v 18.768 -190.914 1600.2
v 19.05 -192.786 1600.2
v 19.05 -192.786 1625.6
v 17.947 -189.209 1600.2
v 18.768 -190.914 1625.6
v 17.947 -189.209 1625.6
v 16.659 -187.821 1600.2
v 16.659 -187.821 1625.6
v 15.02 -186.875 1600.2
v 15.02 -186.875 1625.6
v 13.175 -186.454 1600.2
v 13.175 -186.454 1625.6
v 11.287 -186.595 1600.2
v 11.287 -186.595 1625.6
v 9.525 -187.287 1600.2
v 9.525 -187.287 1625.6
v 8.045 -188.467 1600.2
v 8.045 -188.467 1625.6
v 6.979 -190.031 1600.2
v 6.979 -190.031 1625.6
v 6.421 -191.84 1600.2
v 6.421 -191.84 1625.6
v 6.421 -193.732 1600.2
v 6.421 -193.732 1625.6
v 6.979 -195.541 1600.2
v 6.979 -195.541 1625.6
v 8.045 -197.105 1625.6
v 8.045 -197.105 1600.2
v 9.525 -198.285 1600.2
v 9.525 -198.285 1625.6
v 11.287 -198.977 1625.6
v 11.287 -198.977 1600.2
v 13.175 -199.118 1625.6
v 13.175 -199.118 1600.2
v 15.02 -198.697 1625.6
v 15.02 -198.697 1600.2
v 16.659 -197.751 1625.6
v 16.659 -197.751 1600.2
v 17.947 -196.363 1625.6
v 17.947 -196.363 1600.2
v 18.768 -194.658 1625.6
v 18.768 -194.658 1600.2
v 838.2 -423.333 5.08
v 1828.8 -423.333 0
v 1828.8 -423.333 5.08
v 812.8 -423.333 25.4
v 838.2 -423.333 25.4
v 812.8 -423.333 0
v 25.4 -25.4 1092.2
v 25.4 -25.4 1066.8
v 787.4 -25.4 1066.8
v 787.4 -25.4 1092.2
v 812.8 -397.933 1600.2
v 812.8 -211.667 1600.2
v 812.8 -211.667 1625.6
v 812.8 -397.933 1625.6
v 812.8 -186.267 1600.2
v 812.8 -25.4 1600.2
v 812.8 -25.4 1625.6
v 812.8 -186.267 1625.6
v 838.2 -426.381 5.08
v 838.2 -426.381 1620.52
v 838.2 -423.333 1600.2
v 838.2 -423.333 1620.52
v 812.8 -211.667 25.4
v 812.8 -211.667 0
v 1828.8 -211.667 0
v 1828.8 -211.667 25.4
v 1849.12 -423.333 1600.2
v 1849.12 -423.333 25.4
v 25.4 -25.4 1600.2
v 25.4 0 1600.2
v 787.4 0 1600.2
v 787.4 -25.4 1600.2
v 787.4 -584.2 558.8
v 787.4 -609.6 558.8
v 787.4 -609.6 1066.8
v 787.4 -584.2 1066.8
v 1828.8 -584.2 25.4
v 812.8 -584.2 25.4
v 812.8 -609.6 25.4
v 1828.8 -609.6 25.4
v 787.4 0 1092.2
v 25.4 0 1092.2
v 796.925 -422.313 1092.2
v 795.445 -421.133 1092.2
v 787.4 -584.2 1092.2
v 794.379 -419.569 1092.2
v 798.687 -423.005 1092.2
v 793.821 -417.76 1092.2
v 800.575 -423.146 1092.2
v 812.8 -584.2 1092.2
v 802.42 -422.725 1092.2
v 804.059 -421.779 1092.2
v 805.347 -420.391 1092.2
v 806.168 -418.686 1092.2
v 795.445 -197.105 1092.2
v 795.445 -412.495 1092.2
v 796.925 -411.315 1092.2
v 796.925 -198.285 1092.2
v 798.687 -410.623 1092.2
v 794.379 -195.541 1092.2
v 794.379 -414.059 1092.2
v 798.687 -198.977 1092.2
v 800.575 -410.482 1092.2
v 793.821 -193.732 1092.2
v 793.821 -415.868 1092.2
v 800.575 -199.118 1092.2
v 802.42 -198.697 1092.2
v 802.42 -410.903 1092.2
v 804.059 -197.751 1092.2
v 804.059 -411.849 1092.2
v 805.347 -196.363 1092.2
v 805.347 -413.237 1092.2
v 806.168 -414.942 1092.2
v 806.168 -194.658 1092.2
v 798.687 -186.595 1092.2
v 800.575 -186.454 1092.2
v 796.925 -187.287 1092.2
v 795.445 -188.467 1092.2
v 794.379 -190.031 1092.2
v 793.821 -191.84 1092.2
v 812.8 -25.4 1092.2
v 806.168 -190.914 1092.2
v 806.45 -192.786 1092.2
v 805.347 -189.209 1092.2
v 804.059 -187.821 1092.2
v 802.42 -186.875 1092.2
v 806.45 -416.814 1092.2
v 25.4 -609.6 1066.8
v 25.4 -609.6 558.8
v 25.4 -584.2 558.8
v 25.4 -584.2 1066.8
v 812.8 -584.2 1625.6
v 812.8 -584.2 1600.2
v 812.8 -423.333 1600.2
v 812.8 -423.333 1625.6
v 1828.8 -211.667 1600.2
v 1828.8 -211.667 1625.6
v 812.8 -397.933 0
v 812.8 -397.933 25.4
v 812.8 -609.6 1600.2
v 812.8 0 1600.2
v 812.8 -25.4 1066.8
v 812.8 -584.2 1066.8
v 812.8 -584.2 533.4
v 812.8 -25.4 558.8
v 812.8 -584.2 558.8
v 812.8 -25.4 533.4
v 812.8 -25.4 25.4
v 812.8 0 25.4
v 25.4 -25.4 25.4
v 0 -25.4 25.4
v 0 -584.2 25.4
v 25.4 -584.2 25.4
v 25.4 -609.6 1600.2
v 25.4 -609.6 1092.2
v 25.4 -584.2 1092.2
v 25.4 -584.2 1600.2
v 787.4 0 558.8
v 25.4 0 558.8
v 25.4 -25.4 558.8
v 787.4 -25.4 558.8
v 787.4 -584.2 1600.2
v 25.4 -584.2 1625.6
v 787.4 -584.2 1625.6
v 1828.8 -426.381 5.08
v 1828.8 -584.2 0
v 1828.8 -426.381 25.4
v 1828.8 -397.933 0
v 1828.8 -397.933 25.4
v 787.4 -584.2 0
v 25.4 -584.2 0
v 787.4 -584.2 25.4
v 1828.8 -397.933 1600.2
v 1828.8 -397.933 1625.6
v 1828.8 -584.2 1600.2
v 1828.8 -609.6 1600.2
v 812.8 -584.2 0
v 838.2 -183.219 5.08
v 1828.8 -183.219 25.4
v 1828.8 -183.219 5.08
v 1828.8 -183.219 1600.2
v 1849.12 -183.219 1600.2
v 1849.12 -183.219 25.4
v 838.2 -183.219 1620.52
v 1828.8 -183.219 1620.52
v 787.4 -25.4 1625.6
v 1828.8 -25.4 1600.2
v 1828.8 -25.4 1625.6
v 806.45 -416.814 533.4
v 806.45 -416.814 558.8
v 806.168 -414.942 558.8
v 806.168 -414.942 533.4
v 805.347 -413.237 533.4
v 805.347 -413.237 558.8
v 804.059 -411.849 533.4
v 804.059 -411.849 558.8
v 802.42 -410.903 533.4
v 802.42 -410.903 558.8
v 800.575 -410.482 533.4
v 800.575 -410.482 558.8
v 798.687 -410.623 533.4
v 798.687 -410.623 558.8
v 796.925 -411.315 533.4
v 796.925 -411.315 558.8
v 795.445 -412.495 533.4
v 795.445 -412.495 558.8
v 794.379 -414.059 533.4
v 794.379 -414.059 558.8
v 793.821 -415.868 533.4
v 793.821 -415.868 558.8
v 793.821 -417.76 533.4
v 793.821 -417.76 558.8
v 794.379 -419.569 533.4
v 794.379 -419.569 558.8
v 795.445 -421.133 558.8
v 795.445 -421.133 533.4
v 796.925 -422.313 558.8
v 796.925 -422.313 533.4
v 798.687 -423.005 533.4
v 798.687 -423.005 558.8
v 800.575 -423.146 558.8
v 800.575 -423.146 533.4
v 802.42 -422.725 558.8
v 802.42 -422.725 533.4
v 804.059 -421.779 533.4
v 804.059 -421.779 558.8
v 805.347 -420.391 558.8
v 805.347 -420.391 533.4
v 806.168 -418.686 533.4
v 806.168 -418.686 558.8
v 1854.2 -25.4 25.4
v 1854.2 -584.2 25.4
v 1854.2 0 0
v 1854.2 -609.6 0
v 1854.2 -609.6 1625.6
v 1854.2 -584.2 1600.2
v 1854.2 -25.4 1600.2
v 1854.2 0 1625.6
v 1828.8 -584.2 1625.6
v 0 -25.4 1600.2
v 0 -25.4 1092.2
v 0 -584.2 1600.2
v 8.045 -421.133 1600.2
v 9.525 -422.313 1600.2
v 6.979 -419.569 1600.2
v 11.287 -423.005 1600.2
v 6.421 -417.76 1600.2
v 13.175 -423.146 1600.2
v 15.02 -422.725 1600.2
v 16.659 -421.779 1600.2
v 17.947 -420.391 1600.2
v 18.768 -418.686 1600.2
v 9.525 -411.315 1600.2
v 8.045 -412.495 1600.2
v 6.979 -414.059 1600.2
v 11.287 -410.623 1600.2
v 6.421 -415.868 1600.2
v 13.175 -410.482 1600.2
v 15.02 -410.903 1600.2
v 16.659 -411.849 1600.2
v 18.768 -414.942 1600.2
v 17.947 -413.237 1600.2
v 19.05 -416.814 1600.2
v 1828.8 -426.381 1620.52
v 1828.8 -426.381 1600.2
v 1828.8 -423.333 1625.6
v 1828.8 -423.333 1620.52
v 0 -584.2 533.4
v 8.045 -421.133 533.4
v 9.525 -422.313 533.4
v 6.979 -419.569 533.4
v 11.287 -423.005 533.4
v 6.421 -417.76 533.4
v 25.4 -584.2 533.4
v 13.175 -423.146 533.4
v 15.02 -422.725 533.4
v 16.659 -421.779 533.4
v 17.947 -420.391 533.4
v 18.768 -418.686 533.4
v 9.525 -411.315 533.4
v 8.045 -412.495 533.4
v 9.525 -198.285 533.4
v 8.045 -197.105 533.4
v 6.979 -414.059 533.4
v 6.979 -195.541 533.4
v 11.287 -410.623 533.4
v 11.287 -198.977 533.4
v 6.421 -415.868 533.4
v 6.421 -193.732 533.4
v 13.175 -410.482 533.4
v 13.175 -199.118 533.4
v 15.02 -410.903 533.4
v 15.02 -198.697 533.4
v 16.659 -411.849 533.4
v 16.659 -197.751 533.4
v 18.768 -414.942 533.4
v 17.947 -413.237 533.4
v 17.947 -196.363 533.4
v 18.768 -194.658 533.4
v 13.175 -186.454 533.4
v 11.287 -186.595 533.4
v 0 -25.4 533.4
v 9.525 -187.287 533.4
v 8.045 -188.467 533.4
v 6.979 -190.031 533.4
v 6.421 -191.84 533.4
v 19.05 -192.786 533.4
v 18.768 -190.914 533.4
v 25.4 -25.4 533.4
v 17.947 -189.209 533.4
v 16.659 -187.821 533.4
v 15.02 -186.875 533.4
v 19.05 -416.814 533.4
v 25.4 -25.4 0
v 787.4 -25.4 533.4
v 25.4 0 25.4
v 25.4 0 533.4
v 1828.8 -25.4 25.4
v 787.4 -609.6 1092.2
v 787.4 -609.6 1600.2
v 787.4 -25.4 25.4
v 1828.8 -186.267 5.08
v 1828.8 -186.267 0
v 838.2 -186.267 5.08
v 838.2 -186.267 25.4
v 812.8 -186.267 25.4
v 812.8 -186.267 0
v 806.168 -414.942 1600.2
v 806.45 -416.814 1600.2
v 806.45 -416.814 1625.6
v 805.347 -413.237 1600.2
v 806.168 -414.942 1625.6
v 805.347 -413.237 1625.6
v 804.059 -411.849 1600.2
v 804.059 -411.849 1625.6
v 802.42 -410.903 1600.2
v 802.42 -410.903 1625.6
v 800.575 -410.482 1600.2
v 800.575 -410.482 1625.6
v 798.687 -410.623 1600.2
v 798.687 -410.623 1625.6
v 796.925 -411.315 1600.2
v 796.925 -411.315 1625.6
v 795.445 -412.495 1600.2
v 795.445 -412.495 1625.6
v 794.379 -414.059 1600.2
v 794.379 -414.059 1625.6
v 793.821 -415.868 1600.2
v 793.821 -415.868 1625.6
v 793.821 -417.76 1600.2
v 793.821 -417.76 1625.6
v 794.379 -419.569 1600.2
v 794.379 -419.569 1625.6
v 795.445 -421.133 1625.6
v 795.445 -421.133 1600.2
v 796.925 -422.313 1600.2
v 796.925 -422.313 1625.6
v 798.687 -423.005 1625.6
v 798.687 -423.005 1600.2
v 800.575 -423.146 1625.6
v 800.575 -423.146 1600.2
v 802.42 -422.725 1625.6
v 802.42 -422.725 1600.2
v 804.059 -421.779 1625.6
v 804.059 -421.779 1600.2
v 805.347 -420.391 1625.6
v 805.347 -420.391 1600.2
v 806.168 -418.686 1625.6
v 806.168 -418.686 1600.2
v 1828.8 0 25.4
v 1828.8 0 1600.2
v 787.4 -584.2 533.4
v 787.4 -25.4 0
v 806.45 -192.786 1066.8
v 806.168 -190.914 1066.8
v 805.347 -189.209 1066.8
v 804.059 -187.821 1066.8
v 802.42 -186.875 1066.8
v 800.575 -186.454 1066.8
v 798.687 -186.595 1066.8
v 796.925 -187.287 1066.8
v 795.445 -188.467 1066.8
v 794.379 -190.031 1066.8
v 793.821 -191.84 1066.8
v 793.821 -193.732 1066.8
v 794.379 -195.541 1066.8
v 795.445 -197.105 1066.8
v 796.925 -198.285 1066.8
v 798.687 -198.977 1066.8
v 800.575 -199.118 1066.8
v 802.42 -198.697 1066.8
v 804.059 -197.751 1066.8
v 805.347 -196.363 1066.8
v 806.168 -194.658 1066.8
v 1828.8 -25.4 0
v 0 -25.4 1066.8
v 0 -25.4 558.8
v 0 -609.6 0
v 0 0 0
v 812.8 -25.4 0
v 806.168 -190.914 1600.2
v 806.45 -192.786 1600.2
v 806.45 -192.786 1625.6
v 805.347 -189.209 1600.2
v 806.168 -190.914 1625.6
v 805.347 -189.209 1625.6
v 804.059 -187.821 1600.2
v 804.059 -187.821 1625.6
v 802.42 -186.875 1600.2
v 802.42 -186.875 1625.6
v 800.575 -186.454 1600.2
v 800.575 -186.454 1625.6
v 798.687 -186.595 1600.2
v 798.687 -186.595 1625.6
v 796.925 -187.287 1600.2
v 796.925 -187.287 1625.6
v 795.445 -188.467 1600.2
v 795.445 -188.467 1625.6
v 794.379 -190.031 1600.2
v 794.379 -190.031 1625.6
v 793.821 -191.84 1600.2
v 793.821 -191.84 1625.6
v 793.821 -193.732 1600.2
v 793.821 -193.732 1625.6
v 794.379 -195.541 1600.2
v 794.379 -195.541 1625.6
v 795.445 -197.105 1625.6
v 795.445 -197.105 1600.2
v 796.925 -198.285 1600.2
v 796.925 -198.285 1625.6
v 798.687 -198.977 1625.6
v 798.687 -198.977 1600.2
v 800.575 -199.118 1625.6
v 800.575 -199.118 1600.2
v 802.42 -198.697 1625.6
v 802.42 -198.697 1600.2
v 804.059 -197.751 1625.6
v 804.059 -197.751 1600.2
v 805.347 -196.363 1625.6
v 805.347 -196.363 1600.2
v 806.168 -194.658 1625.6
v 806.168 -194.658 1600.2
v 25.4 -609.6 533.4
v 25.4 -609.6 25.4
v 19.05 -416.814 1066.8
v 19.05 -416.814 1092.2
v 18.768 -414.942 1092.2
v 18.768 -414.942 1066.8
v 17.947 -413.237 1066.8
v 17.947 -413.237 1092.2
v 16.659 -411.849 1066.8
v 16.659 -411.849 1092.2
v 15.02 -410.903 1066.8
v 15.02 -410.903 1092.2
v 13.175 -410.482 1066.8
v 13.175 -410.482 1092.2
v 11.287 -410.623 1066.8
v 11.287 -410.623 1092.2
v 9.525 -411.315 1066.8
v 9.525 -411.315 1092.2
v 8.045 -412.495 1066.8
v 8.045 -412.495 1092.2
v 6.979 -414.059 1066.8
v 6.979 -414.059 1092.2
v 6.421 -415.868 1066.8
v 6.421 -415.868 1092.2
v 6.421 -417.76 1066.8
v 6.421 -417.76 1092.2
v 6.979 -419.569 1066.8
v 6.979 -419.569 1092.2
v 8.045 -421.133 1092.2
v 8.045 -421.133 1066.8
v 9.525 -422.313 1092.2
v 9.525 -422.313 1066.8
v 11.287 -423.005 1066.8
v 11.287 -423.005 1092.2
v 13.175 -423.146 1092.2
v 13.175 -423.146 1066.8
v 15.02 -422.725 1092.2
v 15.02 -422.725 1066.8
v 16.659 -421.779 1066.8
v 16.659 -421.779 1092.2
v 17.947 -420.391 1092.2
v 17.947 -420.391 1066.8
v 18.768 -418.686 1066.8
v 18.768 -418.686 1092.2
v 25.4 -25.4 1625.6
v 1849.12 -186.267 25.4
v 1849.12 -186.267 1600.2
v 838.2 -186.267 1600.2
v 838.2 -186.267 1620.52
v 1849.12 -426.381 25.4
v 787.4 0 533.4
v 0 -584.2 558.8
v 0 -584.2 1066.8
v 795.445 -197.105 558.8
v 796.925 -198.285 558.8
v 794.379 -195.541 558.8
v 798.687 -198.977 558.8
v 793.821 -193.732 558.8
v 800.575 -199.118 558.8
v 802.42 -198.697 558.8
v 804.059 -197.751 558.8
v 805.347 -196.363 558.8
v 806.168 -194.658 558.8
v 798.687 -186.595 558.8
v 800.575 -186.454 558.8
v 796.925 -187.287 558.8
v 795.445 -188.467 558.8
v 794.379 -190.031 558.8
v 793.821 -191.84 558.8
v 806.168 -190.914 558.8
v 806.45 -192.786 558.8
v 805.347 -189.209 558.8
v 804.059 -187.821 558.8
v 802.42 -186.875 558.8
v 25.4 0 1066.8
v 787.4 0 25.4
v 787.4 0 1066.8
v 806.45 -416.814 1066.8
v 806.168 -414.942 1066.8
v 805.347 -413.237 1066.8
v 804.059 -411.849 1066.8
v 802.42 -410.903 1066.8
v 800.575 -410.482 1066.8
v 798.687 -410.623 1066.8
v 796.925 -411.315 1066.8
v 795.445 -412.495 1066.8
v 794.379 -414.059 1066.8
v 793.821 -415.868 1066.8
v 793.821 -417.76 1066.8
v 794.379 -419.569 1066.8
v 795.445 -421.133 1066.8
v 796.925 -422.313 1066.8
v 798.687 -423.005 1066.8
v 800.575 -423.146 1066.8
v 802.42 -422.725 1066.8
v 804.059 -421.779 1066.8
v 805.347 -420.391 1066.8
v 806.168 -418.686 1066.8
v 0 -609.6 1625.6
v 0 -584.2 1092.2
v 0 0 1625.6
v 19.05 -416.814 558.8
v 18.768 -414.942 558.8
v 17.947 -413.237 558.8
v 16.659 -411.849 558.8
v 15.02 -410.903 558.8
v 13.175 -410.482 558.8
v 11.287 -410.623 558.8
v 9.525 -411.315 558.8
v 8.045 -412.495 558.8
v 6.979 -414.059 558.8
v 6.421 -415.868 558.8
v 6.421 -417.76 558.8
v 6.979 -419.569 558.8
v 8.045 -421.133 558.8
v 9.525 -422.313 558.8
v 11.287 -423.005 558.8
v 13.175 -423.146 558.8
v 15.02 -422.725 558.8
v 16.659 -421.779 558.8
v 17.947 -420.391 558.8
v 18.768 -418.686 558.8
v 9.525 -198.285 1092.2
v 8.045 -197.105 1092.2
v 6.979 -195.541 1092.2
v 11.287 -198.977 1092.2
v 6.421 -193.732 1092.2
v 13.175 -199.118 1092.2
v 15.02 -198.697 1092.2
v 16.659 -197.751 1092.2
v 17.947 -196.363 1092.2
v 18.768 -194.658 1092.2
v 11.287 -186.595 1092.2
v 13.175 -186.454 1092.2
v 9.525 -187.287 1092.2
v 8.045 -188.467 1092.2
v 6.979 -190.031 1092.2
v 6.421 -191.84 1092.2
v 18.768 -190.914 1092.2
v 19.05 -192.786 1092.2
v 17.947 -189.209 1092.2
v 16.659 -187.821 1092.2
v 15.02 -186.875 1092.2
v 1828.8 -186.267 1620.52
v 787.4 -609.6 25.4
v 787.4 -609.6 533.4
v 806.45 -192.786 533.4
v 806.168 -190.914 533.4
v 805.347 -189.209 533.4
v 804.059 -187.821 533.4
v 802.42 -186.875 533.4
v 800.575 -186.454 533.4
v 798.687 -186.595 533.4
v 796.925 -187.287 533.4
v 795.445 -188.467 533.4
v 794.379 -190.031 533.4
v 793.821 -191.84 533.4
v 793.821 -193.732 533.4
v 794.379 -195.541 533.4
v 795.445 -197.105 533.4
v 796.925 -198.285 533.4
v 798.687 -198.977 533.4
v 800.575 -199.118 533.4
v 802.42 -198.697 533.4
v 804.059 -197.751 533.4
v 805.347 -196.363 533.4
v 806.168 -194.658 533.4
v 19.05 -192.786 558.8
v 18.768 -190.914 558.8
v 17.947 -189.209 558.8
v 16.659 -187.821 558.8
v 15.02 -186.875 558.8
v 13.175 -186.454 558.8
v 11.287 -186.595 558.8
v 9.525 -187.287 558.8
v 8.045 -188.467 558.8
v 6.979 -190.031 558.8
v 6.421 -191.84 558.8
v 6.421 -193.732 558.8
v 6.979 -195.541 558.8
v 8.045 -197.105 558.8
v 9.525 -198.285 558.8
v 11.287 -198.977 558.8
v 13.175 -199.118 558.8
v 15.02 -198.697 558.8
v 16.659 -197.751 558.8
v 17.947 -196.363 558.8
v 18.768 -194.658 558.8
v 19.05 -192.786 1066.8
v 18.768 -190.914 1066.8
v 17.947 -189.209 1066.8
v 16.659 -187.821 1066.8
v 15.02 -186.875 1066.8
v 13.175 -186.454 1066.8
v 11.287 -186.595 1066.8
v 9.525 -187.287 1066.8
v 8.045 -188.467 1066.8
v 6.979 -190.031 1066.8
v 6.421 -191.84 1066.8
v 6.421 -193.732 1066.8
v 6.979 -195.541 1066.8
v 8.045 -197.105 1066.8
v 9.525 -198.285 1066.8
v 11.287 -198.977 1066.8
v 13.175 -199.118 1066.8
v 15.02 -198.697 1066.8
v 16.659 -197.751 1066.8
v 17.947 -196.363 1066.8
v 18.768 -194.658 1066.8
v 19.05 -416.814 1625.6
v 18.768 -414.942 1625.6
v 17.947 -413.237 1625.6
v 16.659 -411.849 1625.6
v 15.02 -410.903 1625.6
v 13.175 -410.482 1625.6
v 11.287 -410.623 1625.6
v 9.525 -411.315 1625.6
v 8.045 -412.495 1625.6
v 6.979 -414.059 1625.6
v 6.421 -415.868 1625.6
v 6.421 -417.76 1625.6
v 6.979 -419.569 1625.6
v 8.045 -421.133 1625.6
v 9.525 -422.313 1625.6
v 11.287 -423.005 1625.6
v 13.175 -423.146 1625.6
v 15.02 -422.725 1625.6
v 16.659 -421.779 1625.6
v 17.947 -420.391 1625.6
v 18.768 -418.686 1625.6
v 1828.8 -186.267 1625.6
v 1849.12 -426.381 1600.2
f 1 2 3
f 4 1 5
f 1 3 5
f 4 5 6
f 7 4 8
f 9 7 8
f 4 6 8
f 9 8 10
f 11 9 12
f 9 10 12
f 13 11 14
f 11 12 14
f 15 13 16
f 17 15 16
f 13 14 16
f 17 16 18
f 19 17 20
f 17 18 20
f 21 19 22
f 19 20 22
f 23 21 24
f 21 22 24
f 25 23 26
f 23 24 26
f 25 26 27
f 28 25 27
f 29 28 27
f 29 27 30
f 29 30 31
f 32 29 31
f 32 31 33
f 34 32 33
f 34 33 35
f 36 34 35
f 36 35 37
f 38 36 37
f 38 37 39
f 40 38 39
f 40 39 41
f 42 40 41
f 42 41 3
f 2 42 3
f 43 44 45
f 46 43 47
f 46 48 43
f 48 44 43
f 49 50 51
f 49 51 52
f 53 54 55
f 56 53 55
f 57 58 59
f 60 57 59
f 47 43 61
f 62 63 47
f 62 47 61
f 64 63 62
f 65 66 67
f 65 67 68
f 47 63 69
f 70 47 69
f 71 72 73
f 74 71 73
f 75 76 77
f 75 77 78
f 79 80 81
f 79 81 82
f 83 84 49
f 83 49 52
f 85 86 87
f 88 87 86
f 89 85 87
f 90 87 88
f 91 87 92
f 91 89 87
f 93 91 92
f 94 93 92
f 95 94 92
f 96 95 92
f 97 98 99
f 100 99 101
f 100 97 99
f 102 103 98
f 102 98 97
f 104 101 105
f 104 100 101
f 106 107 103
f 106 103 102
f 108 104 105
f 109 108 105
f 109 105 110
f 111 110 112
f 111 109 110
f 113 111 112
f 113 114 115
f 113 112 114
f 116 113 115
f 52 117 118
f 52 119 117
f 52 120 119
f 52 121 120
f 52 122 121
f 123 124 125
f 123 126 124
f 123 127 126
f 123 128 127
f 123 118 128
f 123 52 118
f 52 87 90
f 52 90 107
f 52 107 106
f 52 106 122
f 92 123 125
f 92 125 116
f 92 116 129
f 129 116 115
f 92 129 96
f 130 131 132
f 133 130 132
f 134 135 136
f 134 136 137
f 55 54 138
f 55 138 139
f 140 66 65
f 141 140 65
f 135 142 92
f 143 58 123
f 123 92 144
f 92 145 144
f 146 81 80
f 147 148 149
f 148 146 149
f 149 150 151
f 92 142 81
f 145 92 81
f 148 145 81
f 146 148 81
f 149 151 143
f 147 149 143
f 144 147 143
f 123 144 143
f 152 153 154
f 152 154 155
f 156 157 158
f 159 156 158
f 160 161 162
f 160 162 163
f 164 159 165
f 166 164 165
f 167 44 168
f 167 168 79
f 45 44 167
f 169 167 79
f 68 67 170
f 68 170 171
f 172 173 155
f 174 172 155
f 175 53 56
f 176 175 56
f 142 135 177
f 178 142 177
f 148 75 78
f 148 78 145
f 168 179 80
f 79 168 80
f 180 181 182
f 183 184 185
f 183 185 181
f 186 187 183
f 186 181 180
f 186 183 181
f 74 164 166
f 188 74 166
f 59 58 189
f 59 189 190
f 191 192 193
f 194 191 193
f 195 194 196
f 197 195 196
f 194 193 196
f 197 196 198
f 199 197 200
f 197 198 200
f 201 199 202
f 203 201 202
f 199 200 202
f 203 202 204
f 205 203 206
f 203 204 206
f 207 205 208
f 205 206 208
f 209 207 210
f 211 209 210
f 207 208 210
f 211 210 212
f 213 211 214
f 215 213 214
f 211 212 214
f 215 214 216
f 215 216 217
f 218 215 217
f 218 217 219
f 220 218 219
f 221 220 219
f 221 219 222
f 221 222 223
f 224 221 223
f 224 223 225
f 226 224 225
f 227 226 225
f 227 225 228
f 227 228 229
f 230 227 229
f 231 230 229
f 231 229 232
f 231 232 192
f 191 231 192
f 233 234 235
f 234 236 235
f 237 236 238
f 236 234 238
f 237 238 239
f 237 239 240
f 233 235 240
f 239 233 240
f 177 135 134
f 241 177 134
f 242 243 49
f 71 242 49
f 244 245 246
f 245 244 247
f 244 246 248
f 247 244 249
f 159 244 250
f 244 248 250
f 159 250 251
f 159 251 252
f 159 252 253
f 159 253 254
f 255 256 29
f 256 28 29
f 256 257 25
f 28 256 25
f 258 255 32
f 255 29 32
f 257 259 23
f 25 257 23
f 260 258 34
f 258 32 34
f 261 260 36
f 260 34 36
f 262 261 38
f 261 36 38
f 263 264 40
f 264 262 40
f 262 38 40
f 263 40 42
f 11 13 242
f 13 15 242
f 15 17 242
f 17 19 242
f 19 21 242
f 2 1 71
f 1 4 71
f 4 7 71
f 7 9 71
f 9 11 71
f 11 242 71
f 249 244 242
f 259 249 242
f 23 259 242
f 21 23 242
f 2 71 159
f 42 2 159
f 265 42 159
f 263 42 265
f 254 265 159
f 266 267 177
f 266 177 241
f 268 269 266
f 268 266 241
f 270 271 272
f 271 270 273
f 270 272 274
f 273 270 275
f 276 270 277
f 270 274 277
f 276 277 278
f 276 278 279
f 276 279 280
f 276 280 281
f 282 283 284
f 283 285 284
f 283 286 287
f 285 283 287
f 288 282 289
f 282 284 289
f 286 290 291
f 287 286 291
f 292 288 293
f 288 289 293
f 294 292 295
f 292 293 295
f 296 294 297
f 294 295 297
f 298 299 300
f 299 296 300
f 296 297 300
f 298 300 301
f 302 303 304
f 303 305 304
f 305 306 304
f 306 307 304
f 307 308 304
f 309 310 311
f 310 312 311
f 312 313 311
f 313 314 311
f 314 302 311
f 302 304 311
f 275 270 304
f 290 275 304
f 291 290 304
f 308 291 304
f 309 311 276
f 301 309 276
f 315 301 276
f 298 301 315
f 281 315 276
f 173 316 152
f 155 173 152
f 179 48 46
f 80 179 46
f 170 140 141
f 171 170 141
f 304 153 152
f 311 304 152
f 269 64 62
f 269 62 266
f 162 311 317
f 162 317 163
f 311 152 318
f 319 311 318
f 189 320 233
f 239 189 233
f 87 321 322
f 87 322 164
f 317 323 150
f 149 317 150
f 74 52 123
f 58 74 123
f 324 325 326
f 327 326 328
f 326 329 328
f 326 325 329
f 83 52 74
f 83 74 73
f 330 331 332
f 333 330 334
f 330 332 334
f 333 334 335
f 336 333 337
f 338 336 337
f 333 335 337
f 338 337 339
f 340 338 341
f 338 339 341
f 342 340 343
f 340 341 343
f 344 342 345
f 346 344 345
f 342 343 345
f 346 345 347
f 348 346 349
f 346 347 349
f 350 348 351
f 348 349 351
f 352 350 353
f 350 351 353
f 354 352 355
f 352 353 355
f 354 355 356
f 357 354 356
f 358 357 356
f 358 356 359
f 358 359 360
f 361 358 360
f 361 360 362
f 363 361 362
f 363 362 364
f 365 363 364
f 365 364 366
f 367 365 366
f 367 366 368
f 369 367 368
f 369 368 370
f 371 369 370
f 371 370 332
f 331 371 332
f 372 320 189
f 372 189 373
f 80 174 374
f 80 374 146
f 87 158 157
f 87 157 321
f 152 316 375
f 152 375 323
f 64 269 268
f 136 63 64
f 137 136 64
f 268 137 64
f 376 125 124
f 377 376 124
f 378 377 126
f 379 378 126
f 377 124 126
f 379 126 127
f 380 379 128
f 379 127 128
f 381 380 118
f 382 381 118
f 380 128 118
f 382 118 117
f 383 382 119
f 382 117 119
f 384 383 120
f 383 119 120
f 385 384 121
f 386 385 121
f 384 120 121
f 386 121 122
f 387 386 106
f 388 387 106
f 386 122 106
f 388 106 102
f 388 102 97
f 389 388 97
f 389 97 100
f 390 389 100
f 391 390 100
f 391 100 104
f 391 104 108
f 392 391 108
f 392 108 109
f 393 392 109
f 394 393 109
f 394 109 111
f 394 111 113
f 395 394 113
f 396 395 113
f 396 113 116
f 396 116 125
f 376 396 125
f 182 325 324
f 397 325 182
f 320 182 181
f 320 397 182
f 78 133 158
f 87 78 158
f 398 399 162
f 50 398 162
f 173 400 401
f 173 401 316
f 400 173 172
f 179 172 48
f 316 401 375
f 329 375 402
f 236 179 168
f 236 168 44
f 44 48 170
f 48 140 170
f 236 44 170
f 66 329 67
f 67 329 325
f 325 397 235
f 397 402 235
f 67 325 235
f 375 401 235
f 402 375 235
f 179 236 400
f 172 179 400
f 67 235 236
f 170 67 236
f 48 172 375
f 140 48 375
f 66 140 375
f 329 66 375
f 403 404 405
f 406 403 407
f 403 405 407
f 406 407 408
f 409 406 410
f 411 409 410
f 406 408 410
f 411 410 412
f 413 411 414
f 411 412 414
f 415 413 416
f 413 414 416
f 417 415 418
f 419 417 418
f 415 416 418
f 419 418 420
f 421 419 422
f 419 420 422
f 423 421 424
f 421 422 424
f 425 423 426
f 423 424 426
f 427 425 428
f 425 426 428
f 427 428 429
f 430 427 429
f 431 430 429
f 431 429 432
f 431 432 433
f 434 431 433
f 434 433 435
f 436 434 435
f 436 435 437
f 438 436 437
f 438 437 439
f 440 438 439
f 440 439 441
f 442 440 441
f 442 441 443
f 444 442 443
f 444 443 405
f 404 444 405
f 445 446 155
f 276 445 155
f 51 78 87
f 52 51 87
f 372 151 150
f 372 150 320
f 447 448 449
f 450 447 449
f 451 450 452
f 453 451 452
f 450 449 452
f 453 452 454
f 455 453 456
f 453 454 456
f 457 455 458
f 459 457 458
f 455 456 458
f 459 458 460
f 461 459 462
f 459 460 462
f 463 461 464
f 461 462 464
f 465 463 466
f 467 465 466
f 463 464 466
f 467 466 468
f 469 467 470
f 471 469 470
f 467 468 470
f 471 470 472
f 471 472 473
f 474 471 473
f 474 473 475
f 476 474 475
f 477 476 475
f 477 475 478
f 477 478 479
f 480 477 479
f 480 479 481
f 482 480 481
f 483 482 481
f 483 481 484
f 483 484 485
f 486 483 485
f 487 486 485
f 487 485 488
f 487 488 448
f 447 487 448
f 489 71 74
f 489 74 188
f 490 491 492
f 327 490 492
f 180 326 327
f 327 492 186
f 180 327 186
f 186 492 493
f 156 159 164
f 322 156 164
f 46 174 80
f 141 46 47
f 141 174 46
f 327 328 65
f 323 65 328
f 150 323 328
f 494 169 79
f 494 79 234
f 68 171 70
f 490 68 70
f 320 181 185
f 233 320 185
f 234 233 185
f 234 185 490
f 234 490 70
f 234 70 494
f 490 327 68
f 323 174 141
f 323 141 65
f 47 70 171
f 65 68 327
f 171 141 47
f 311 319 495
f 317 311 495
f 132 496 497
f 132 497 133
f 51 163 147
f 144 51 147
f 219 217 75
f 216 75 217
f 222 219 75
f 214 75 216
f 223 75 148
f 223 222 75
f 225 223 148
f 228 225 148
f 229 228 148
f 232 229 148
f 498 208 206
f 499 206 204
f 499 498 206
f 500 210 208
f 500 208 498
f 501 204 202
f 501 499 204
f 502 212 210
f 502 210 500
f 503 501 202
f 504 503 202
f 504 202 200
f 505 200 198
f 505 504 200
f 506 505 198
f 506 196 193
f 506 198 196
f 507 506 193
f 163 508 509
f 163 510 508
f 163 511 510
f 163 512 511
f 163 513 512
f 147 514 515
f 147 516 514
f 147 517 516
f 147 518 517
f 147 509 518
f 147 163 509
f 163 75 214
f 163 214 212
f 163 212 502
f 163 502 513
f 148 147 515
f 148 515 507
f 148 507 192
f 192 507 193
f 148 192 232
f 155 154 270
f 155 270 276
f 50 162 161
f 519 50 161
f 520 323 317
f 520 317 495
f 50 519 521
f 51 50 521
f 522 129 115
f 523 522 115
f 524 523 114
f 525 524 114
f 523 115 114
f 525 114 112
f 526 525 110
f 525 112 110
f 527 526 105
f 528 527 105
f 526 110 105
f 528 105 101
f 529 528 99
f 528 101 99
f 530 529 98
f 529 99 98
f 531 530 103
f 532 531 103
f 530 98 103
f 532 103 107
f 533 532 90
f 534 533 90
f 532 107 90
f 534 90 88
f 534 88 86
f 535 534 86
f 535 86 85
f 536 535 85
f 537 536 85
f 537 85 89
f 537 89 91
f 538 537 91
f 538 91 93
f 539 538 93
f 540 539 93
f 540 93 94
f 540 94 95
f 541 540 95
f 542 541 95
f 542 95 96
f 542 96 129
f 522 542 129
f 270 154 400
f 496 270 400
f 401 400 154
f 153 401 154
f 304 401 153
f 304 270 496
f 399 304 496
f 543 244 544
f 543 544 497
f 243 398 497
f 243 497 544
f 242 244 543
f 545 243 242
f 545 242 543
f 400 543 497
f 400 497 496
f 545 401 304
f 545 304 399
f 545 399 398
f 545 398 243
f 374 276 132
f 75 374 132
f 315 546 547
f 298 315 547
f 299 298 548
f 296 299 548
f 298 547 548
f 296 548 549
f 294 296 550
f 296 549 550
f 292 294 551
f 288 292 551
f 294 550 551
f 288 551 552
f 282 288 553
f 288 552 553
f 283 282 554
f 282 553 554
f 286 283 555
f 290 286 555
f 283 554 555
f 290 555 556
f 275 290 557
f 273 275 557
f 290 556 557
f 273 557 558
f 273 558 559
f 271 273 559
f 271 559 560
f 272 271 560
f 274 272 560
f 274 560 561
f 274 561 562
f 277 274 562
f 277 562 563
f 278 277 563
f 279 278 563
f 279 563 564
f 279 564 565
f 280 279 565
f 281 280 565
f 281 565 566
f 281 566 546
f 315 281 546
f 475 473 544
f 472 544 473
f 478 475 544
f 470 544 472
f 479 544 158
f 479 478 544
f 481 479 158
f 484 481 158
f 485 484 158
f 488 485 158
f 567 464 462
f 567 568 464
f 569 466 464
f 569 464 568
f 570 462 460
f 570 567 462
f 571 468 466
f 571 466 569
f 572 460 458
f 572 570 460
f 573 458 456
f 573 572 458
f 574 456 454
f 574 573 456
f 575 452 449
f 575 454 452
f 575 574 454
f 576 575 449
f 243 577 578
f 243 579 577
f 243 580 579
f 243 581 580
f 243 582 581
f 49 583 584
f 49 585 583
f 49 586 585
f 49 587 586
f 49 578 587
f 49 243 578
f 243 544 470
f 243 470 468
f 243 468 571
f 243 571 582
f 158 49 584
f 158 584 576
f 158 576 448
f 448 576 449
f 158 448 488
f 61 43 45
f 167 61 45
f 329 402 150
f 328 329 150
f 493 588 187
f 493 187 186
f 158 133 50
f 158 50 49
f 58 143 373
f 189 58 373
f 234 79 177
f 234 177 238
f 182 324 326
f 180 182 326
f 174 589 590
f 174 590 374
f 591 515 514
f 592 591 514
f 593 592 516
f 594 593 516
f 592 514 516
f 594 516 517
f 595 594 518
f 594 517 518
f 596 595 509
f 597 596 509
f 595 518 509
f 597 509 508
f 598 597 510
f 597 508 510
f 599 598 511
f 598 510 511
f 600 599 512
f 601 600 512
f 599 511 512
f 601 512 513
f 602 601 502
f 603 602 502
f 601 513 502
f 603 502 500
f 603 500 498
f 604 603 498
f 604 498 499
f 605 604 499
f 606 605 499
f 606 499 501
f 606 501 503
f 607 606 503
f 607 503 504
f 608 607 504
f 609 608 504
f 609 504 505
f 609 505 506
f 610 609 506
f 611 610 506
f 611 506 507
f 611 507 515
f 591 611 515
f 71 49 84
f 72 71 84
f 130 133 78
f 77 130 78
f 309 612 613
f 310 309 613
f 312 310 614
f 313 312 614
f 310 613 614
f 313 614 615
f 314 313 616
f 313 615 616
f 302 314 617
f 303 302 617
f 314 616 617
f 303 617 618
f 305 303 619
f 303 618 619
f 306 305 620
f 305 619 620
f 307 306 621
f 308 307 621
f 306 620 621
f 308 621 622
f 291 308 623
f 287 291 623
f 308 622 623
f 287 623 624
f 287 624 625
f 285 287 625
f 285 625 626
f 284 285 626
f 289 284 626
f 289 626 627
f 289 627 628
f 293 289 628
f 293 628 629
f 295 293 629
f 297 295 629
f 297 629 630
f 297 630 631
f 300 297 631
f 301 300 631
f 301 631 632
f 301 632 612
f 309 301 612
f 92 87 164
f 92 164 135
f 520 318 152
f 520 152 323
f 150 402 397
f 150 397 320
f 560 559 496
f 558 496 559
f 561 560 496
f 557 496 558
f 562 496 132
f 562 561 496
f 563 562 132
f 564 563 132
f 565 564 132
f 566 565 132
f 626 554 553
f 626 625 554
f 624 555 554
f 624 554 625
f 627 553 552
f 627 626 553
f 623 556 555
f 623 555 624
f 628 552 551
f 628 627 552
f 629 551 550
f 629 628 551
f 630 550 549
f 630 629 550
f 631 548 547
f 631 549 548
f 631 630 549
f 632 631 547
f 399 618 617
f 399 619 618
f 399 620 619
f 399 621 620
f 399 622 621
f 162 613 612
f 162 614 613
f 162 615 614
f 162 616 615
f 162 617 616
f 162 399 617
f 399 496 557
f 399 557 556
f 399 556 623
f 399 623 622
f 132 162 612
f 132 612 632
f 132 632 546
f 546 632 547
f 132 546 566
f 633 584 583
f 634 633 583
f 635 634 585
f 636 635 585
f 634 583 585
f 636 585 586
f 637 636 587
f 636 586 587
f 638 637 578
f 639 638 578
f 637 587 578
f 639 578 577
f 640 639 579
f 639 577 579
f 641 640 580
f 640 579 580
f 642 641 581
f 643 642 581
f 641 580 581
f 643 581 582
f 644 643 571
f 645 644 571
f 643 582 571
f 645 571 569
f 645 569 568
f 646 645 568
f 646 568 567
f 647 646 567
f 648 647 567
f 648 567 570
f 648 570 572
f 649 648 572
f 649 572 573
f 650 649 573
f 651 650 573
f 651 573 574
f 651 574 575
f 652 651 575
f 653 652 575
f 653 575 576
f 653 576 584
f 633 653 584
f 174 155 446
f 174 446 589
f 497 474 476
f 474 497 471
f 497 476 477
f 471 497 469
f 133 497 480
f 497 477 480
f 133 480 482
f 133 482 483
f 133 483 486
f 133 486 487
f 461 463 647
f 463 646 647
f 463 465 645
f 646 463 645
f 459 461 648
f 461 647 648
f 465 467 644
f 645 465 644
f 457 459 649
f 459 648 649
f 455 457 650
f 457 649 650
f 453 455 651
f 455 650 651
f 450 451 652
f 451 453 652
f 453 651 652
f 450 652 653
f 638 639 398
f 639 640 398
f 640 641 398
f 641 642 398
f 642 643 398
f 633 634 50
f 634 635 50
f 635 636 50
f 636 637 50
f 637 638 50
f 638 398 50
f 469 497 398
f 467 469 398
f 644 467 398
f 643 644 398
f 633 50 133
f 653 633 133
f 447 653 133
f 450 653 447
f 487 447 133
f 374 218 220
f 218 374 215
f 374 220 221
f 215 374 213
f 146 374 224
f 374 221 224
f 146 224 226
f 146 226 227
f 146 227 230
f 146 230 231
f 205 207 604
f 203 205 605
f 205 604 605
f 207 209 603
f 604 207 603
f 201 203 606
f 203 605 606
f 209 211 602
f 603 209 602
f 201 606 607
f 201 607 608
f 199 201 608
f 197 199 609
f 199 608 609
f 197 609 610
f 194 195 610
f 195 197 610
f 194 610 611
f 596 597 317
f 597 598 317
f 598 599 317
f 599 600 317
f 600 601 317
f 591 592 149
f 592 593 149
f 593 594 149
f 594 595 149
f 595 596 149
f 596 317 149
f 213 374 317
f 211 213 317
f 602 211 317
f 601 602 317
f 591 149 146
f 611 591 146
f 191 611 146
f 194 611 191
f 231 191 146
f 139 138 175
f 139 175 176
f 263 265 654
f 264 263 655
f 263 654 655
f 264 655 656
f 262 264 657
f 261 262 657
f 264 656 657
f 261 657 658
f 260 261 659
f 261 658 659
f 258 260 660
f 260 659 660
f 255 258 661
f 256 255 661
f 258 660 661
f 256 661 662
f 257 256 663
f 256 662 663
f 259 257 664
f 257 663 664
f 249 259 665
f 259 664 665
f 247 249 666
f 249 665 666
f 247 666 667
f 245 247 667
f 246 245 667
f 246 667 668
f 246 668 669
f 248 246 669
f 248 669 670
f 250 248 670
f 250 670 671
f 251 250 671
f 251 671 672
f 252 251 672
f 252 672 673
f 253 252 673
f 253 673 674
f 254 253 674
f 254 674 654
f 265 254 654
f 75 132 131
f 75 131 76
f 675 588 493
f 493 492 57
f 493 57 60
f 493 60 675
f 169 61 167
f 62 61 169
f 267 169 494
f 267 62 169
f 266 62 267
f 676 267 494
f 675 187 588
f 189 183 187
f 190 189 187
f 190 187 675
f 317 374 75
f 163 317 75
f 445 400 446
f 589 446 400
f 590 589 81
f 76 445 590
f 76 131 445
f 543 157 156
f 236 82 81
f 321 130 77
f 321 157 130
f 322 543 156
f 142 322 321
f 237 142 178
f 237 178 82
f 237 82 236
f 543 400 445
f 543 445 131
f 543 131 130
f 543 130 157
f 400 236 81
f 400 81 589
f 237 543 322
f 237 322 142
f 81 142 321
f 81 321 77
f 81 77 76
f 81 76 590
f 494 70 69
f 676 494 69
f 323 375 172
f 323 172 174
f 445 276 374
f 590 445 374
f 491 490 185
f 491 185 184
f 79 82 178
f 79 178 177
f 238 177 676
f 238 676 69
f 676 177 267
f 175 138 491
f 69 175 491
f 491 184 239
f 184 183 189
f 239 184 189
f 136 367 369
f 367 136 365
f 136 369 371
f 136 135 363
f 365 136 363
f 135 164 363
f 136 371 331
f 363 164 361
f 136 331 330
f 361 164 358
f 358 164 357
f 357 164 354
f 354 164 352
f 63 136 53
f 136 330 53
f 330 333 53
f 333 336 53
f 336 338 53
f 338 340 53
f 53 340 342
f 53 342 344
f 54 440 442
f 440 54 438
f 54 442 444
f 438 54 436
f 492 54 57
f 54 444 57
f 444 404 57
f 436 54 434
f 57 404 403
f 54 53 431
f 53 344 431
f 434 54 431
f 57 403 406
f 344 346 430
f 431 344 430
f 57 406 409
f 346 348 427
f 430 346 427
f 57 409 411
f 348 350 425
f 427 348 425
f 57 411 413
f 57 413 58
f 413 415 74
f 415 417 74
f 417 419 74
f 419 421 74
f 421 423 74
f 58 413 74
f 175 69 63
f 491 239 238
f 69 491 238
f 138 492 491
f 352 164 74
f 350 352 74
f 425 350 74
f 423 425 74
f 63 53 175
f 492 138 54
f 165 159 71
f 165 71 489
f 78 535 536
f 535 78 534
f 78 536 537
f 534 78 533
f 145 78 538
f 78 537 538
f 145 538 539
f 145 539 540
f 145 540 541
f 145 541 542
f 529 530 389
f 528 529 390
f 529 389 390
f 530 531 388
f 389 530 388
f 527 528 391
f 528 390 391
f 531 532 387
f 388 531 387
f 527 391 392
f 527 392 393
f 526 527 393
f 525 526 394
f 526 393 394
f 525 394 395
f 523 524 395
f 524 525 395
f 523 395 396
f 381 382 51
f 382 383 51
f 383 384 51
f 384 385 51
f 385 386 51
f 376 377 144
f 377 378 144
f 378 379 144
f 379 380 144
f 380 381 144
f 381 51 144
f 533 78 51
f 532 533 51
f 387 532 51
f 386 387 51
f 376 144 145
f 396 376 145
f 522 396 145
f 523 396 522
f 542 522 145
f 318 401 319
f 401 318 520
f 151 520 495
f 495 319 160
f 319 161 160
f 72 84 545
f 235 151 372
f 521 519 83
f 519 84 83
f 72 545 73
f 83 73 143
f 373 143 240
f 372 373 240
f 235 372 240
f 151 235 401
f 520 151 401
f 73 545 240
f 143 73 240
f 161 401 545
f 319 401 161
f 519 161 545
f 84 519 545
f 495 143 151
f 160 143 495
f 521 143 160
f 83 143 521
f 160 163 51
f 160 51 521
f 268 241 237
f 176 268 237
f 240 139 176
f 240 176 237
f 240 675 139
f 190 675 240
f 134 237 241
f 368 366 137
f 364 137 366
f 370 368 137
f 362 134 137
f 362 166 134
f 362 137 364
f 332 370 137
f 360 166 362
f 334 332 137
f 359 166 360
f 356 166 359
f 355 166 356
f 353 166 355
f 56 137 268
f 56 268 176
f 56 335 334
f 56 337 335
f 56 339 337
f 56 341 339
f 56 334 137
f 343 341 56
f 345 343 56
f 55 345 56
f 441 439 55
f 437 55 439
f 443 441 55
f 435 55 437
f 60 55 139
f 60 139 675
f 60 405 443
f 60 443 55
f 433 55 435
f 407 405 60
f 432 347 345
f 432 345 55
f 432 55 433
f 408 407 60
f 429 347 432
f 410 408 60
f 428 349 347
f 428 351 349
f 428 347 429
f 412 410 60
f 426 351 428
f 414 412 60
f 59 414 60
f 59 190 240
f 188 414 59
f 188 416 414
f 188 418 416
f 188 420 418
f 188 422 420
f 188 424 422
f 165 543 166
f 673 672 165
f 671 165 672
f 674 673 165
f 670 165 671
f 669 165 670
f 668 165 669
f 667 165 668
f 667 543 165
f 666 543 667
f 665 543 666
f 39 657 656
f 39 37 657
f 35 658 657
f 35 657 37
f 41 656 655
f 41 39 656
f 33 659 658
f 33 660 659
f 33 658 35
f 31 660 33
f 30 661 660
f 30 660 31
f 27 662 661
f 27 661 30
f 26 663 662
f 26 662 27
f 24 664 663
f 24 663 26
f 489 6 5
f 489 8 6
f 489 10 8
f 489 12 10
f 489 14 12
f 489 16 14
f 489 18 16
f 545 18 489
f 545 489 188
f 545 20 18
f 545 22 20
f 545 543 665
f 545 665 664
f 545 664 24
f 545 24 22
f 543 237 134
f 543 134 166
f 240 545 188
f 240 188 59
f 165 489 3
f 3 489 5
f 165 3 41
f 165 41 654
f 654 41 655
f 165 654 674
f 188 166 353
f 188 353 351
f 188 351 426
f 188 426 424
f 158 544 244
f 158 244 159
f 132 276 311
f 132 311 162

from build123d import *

# Parameters (mm, degrees)
F0_W      = 25.4
F0_H      = 25.4
F1_DEPTH  = 609.6
F2_W      = 25.4
F2_H      = 25.4
F3_DEPTH  = 1854.2
F4_W      = 25.4
F4_H      = 25.4
F5_DEPTH  = 812.8
F6_W      = 25.4
F6_H      = 25.4
F7_DEPTH  = 1625.6
F8_W      = 25.4
F8_H      = 25.4
F9_DEPTH  = 1041.4
F10_W     = 1010.92
F10_H     = 1615.44
F11_DEPTH = 3.048
F12_W     = 1010.92
F12_H     = 1615.44
F13_DEPTH = 3.048
F14_R     = 6.35
F15_DEPTH = 1600.2


with BuildPart() as f1:
    # F0 (on Front) → F1 (new body)
    with BuildSketch(Plane.XZ):
        with Locations((12.7, 12.7)):
            Rectangle(F0_W, F0_H)
        with Locations((12.7, 546.1)):
            Rectangle(F0_W, F0_H)
        with Locations((12.7, 1079.5)):
            Rectangle(F0_W, F0_H)
        with Locations((12.7, 1612.9)):
            Rectangle(F0_W, F0_H)
        with Locations((800.1, 1612.9)):
            Rectangle(F0_W, F0_H)
        with Locations((800.1, 1079.5)):
            Rectangle(F0_W, F0_H)
        with Locations((800.1, 546.1)):
            Rectangle(F0_W, F0_H)
        with Locations((800.1, 12.7)):
            Rectangle(F0_W, F0_H)
        with Locations((1841.5, 1612.9)):
            Rectangle(F0_W, F0_H)
        with Locations((1841.5, 12.7)):
            Rectangle(F0_W, F0_H)
    extrude(amount=F1_DEPTH)

    # F2 (on Right) → F3 (join, through all)
    with BuildSketch(Plane.YZ):
        with Locations((-596.9, 1612.9)):
            Rectangle(F2_W, F2_H)
        with Locations((-12.7, 1612.9)):
            Rectangle(F2_W, F2_H)
        with Locations((-596.9, 12.7)):
            Rectangle(F2_W, F2_H)
        with Locations((-12.7, 12.7)):
            Rectangle(F2_W, F2_H)
    extrude(amount=F3_DEPTH)

    # F4 (on Right) → F5 (join, through all)
    with BuildSketch(Plane.YZ):
        with Locations((-596.9, 546.1)):
            Rectangle(F4_W, F4_H)
        with Locations((-12.7, 546.1)):
            Rectangle(F4_W, F4_H)
        with Locations((-596.9, 1079.5)):
            Rectangle(F4_W, F4_H)
        with Locations((-12.7, 1079.5)):
            Rectangle(F4_W, F4_H)
    extrude(amount=F5_DEPTH)

    # F6 (on Top) → F7 (join, through all)
    with BuildSketch(Plane.XY):
        with Locations((12.7, -12.7)):
            Rectangle(F6_W, F6_H)
        with Locations((800.1, -12.7)):
            Rectangle(F6_W, F6_H)
        with Locations((12.7, -596.9)):
            Rectangle(F6_W, F6_H)
        with Locations((800.1, -596.9)):
            Rectangle(F6_W, F6_H)
        with Locations((1841.5, -596.9)):
            Rectangle(F6_W, F6_H)
        with Locations((1841.5, -12.7)):
            Rectangle(F6_W, F6_H)
    extrude(amount=F7_DEPTH)

    # F8 (on face) → F9 (join, through all)
    with BuildSketch(Plane.YZ.offset(812.8)):
        with Locations((-410.633333, 1612.9)):
            Rectangle(F8_W, F8_H)
        with Locations((-198.966667, 1612.9)):
            Rectangle(F8_W, F8_H)
        with Locations((-410.633333, 12.7)):
            Rectangle(F8_W, F8_H)
        with Locations((-198.966667, 12.7)):
            Rectangle(F8_W, F8_H)
    extrude(amount=F9_DEPTH)

    # F10 (on face) → F11 (join)
    with BuildSketch(Plane.XZ.offset(423.333333)):
        with Locations((1343.66, 812.8)):
            Rectangle(F10_W, F10_H)
    extrude(amount=F11_DEPTH)

    # F12 (on face) → F13 (join)
    with BuildSketch(Plane(origin=(0, -186.266667, 0), x_dir=(-1, 0, 0), z_dir=(0, 1, 0))):
        with Locations((-1343.66, 812.8)):
            Rectangle(F12_W, F12_H)
    extrude(amount=F13_DEPTH)

    # F14 (on face) → F15 (cut, through all)
    with BuildSketch(Plane.XY.offset(1625.6)):
        with Locations((12.7, -416.814)):
            Circle(F14_R)
        with Locations((800.1, -416.814)):
            Circle(F14_R)
        with Locations((800.1, -192.786)):
            Circle(F14_R)
        with Locations((12.7, -192.786)):
            Circle(F14_R)
    extrude(amount=-F15_DEPTH, mode=Mode.SUBTRACT)


solid = f1.part
